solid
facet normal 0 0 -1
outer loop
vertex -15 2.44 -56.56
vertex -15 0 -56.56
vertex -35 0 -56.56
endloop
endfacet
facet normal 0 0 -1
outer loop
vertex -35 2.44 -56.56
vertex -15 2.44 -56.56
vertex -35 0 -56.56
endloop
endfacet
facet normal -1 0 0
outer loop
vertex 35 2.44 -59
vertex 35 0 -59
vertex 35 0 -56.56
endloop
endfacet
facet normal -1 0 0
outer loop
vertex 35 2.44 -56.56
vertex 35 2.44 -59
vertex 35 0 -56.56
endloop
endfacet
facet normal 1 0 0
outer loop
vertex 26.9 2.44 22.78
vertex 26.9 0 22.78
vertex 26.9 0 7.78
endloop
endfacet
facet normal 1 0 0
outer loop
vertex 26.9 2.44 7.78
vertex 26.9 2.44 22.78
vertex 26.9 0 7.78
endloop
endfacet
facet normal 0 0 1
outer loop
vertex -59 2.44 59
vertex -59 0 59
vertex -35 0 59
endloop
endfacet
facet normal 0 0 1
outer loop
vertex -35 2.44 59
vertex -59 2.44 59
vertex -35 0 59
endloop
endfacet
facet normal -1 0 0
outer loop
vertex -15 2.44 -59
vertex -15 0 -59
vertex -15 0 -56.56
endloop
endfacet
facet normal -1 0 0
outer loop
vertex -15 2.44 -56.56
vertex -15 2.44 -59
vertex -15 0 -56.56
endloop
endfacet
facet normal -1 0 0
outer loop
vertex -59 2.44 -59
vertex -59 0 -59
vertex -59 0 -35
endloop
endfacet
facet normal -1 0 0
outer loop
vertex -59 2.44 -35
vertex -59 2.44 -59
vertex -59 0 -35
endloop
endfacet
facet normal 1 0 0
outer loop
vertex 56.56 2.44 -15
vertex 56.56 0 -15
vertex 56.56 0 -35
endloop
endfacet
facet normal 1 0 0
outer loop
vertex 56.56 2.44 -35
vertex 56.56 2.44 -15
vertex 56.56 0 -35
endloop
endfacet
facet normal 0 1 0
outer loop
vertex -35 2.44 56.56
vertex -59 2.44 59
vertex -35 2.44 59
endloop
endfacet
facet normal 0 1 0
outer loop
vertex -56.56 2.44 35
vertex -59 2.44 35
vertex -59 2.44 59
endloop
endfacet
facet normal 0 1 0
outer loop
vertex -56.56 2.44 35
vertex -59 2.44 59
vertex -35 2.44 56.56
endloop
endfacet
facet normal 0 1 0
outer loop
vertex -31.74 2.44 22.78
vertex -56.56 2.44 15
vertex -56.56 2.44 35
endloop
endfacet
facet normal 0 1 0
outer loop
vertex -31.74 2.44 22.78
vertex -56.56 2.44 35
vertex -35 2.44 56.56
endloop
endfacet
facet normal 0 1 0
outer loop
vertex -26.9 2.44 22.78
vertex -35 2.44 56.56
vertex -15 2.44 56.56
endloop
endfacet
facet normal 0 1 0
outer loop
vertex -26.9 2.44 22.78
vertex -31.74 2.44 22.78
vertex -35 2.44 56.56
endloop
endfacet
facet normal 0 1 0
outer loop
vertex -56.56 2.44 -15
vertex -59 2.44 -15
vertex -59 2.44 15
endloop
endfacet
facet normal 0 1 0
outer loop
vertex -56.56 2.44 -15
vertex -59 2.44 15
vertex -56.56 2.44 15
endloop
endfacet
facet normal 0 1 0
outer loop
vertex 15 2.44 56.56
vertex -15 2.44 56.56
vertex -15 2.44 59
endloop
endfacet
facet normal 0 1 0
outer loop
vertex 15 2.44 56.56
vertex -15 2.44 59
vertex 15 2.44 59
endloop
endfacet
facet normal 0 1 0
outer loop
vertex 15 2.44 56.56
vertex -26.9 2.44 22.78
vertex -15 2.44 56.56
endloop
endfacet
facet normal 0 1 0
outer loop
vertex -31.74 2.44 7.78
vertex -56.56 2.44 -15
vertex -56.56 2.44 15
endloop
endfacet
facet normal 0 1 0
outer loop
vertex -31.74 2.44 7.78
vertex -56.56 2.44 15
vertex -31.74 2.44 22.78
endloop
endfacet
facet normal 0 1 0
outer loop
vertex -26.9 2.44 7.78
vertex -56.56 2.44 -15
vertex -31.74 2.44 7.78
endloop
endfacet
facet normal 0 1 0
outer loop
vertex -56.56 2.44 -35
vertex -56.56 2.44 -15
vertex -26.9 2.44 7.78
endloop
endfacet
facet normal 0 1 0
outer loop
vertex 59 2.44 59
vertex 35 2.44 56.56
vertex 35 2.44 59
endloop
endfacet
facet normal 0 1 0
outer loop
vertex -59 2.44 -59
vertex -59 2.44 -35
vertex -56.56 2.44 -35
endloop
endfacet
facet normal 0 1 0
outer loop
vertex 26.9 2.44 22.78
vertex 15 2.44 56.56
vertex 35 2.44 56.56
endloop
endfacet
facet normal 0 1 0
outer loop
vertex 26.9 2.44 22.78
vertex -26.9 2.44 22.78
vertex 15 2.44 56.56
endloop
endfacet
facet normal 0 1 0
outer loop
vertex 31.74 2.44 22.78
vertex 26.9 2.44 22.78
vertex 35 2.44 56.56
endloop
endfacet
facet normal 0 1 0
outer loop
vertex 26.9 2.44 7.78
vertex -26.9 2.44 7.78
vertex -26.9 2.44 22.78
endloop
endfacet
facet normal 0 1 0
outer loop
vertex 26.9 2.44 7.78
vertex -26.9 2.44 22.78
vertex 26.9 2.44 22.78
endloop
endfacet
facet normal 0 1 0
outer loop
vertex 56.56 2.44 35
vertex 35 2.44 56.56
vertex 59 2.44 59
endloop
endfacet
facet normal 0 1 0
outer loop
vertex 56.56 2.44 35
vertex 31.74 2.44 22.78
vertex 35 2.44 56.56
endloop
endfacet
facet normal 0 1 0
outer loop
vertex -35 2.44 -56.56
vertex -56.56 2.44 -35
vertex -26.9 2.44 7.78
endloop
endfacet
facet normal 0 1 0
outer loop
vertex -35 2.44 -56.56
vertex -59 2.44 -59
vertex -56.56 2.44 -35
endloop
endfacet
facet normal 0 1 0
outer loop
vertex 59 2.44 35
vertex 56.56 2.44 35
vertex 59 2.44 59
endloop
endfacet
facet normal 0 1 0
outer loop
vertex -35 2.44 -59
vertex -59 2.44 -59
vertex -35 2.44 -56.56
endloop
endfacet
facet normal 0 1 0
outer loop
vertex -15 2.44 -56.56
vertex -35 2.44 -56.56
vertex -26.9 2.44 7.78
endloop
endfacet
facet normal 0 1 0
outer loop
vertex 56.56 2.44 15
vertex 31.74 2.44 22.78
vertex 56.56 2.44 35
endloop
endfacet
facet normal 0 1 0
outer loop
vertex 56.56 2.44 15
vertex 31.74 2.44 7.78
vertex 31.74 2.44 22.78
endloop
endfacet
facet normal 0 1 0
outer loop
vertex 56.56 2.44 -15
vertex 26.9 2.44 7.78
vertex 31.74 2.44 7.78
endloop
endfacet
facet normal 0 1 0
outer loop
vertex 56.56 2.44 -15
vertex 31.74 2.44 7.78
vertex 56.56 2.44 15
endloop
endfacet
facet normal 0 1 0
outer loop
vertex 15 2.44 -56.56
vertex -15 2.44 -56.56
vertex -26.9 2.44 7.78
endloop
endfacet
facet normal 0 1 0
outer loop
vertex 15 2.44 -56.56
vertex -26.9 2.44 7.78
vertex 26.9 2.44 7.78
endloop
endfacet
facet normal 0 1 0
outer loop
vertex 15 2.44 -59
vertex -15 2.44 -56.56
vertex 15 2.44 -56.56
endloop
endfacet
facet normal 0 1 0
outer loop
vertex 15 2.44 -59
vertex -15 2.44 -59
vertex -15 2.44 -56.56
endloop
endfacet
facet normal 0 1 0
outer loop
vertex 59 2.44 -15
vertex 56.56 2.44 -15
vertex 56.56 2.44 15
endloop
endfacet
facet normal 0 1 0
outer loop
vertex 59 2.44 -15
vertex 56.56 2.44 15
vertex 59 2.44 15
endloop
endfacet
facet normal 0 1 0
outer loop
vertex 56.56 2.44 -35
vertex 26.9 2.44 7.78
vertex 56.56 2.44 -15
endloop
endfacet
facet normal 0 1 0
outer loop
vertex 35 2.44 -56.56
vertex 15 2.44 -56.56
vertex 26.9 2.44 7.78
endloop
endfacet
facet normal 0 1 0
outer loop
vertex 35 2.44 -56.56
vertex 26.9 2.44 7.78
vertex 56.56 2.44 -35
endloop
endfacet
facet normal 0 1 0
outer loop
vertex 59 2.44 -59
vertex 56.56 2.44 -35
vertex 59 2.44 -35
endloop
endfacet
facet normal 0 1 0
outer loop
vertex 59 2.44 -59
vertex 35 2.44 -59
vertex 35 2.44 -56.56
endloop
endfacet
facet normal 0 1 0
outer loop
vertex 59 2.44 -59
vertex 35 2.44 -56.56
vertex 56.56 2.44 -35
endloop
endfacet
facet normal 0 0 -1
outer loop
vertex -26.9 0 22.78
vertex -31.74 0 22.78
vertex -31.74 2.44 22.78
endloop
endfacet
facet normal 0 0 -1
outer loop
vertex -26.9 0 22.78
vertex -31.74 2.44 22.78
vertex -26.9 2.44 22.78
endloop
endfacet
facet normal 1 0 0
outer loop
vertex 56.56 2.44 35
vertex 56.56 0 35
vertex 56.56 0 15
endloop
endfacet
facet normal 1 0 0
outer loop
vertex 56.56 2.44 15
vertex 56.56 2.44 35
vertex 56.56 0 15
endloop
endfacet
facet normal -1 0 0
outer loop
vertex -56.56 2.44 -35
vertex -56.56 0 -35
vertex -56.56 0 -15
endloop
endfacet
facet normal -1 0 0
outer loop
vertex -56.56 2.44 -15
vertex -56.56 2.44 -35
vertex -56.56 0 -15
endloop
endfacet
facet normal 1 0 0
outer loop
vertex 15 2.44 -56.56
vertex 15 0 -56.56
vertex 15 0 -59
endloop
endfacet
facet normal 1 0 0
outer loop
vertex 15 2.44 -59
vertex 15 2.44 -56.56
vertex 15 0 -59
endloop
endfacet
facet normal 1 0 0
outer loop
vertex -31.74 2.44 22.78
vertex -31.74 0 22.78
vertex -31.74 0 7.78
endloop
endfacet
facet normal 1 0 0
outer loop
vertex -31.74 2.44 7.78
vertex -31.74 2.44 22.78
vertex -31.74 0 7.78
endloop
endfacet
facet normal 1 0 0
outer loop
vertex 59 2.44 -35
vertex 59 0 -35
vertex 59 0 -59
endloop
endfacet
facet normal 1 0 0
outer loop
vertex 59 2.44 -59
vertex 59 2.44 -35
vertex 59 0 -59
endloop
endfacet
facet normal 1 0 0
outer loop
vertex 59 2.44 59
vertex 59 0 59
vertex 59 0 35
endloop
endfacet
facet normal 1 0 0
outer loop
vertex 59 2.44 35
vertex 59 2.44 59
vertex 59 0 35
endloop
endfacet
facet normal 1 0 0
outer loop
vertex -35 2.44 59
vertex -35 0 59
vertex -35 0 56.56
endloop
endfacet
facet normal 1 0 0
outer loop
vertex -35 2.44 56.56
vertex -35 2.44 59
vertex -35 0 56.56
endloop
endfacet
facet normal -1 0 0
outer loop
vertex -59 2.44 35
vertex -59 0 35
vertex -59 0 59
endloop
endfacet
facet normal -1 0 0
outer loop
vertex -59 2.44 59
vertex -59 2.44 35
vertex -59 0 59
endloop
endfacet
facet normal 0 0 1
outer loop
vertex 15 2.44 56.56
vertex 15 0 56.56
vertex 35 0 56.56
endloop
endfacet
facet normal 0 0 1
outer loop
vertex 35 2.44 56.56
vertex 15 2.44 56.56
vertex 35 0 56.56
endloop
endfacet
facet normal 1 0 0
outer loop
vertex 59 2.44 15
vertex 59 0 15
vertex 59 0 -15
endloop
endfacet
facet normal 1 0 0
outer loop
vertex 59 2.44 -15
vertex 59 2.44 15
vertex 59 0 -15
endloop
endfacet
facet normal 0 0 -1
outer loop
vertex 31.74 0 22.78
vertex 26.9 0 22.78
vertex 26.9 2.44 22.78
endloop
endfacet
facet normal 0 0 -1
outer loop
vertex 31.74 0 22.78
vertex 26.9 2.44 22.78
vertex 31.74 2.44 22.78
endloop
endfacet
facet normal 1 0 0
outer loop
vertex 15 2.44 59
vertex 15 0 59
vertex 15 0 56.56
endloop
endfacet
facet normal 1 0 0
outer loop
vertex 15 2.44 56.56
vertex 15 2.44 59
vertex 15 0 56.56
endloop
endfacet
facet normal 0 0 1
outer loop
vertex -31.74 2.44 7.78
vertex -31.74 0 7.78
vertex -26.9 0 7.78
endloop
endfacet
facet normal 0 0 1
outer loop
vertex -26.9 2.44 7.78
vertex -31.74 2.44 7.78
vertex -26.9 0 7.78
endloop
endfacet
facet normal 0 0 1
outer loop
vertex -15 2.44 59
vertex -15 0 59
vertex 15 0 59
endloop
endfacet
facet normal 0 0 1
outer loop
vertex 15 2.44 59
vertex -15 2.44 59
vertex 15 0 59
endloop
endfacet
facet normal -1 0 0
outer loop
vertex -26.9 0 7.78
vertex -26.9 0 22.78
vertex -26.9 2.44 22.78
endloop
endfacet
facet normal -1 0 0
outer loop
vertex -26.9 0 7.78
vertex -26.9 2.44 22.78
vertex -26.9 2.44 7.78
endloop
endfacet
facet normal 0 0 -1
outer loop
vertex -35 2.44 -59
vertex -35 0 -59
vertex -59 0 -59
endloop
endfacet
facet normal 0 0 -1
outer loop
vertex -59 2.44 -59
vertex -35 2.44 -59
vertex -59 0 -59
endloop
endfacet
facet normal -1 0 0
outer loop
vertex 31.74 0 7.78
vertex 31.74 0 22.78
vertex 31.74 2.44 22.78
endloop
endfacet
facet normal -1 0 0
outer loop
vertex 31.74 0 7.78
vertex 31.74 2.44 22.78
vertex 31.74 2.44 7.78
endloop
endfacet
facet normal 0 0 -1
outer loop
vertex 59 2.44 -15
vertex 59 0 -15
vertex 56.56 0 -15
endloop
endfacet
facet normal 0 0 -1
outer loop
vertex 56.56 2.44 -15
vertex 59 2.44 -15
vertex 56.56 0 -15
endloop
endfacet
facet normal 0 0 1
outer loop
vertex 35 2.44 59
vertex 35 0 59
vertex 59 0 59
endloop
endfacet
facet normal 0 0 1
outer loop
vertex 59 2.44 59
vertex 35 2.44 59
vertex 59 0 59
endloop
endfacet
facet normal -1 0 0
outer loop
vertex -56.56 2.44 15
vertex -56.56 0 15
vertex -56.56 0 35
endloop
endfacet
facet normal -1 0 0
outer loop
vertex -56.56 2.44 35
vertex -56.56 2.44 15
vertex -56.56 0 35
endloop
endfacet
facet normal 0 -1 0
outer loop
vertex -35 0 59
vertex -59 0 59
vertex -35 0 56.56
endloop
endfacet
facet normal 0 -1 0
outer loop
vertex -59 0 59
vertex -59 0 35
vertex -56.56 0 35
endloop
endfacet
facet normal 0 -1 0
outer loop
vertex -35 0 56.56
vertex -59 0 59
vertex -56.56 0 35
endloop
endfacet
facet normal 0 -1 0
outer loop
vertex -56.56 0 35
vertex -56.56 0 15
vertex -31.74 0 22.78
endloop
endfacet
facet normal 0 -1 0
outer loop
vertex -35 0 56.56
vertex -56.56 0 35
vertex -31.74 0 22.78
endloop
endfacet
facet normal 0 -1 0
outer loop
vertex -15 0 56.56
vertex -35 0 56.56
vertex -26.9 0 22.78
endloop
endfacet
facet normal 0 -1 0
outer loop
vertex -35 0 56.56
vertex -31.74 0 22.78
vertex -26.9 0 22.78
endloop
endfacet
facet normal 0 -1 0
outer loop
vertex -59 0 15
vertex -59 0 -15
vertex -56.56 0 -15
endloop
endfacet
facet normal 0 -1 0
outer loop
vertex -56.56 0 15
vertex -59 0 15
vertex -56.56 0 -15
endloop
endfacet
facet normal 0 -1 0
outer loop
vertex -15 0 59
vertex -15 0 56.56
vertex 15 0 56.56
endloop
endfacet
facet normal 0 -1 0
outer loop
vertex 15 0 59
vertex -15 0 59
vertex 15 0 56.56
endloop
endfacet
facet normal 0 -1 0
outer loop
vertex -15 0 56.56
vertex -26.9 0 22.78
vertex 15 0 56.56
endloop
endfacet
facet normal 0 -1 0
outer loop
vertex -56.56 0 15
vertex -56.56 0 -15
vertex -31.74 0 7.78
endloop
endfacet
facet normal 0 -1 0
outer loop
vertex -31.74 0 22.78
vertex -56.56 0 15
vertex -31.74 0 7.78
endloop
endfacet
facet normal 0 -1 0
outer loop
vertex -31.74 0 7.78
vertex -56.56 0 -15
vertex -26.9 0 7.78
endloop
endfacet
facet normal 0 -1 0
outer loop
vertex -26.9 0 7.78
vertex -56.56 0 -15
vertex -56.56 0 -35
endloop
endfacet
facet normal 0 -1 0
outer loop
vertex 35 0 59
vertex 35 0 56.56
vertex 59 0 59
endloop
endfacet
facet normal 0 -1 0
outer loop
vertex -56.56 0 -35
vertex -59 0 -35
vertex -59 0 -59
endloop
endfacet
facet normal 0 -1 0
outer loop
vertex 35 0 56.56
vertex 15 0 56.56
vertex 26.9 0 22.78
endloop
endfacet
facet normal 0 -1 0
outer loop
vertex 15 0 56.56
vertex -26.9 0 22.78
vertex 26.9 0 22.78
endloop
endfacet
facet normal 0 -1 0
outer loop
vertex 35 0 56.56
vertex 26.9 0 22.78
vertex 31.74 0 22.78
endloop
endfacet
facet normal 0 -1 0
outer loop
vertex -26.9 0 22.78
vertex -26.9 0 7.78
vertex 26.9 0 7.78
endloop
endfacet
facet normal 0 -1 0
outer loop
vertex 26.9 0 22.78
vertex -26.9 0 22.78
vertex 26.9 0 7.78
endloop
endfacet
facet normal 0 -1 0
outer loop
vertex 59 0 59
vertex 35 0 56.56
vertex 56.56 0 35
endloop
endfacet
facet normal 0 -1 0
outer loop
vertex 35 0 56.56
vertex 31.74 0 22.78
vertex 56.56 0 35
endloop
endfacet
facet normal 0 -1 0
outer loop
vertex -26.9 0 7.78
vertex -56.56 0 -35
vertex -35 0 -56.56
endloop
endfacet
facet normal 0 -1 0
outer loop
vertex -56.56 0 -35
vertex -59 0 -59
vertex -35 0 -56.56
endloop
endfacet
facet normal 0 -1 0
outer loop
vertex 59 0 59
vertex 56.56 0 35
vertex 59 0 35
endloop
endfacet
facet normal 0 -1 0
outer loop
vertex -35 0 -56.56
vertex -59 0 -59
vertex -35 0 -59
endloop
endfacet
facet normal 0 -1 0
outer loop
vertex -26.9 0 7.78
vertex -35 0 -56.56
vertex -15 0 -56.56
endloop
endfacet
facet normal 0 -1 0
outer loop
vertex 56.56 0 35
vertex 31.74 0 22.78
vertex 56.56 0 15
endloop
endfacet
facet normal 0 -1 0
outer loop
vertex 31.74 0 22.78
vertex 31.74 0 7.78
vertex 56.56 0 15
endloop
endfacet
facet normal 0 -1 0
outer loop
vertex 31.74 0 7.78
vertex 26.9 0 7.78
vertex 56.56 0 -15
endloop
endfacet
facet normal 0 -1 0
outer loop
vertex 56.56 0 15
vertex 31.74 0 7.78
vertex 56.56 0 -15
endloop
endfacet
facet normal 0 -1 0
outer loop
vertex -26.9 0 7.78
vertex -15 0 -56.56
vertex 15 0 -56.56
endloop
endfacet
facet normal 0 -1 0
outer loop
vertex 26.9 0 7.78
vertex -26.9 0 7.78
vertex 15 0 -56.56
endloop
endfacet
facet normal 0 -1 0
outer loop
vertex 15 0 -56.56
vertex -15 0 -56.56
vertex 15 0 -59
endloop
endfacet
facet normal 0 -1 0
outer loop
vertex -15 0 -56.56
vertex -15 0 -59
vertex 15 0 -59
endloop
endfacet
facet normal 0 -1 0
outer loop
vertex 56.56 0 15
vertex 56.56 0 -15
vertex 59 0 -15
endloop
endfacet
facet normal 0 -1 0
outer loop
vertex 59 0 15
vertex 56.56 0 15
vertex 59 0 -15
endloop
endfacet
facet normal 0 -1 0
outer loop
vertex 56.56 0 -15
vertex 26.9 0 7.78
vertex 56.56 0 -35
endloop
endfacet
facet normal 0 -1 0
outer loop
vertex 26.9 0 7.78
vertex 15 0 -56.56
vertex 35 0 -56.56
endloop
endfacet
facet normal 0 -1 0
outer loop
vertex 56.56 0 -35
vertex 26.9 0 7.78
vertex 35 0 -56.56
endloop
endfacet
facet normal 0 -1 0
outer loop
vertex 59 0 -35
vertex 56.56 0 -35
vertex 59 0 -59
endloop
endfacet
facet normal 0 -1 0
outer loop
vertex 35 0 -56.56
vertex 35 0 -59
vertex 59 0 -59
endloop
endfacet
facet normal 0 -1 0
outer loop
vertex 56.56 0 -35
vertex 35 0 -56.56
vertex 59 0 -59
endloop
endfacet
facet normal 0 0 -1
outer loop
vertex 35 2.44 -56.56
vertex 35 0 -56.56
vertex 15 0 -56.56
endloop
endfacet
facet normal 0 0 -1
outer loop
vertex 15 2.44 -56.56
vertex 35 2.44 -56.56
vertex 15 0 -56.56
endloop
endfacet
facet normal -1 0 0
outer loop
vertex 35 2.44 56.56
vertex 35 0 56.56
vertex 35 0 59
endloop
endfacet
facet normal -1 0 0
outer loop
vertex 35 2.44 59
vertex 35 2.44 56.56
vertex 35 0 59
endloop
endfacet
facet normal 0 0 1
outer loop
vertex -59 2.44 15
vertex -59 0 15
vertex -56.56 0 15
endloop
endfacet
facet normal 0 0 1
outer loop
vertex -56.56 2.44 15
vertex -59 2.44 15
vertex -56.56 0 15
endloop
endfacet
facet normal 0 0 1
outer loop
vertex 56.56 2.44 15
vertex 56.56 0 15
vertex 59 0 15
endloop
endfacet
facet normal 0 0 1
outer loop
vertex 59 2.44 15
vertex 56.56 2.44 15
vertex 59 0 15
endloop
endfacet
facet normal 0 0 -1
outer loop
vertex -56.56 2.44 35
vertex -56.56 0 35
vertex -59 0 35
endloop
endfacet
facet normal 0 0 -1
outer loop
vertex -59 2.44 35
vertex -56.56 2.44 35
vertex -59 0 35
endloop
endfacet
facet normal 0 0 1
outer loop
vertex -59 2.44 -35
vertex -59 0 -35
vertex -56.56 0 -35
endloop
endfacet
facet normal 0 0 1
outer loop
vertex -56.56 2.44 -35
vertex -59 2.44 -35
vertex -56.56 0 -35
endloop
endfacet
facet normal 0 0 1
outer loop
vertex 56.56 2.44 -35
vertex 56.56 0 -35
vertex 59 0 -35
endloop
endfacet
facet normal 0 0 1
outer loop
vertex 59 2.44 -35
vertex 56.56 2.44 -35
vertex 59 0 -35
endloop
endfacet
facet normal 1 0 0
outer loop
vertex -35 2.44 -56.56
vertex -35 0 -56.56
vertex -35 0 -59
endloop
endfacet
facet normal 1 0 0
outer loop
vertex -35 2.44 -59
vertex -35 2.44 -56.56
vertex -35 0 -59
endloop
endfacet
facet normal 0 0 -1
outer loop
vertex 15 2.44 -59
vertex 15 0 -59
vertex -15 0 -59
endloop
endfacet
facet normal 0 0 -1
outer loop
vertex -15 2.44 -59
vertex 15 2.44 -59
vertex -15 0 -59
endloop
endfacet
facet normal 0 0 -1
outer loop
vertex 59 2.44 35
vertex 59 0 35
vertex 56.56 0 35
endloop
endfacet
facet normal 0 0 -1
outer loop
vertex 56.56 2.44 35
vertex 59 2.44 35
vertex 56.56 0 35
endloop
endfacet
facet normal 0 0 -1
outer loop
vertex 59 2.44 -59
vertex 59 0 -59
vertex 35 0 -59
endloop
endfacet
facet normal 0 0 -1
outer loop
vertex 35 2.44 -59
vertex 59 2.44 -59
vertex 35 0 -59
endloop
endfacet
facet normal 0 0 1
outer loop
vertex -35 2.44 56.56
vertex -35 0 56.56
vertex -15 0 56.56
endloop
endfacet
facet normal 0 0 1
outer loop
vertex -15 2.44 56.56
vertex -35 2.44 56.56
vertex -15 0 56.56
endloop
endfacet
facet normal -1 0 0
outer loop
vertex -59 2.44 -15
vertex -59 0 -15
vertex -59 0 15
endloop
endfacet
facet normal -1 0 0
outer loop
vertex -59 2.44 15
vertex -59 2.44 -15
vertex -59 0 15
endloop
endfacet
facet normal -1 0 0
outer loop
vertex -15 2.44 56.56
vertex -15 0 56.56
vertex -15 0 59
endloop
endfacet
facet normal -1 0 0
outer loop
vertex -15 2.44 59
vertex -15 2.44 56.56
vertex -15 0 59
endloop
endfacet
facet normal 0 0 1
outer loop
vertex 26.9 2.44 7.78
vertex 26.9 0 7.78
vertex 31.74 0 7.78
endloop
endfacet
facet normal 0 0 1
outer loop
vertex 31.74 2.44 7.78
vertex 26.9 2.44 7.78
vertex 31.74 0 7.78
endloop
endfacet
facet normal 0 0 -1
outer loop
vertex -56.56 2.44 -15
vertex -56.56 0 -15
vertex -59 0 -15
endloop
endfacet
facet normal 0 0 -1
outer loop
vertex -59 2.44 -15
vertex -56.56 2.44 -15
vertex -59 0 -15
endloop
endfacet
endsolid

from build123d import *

# Parameters (mm, degrees)
CROQUIS1_W              = 4.84
CROQUIS1_H              = 15
SALIENTE_EXTRUIR1_DEPTH = 2.44


with BuildPart() as part:
    # Croquis1 → Saliente-Extruir1 (new body)
    with BuildSketch(Plane(origin=(0, 0, 0), x_dir=(1, 0, 0), z_dir=(0, 1, 0))):
        Polygon((-59, -59), (-35, -59), (-35, -56.56), (-15, -56.56), (-15, -59), (15, -59), (15, -56.56), (35, -56.56), (35, -59), (59, -59), (59, -35), (56.56, -35), (56.56, -15), (59, -15), (59, 15), (56.56, 15), (56.56, 35), (59, 35), (59, 59), (35, 59), (35, 56.56), (15, 56.56), (15, 59), (-15, 59), (-15, 56.56), (-35, 56.56), (-35, 59), (-59, 59), (-59, 35), (-56.56, 35), (-56.56, 15), (-59, 15), (-59, -15), (-56.56, -15), (-56.56, -35), (-59, -35), align=None)
        with Locations((-29.32, -15.28)):
            Rectangle(CROQUIS1_W, CROQUIS1_H, mode=Mode.SUBTRACT)
        with Locations((29.32, -15.28)):
            Rectangle(CROQUIS1_W, CROQUIS1_H, mode=Mode.SUBTRACT)
    extrude(amount=SALIENTE_EXTRUIR1_DEPTH)


solid = part.part
